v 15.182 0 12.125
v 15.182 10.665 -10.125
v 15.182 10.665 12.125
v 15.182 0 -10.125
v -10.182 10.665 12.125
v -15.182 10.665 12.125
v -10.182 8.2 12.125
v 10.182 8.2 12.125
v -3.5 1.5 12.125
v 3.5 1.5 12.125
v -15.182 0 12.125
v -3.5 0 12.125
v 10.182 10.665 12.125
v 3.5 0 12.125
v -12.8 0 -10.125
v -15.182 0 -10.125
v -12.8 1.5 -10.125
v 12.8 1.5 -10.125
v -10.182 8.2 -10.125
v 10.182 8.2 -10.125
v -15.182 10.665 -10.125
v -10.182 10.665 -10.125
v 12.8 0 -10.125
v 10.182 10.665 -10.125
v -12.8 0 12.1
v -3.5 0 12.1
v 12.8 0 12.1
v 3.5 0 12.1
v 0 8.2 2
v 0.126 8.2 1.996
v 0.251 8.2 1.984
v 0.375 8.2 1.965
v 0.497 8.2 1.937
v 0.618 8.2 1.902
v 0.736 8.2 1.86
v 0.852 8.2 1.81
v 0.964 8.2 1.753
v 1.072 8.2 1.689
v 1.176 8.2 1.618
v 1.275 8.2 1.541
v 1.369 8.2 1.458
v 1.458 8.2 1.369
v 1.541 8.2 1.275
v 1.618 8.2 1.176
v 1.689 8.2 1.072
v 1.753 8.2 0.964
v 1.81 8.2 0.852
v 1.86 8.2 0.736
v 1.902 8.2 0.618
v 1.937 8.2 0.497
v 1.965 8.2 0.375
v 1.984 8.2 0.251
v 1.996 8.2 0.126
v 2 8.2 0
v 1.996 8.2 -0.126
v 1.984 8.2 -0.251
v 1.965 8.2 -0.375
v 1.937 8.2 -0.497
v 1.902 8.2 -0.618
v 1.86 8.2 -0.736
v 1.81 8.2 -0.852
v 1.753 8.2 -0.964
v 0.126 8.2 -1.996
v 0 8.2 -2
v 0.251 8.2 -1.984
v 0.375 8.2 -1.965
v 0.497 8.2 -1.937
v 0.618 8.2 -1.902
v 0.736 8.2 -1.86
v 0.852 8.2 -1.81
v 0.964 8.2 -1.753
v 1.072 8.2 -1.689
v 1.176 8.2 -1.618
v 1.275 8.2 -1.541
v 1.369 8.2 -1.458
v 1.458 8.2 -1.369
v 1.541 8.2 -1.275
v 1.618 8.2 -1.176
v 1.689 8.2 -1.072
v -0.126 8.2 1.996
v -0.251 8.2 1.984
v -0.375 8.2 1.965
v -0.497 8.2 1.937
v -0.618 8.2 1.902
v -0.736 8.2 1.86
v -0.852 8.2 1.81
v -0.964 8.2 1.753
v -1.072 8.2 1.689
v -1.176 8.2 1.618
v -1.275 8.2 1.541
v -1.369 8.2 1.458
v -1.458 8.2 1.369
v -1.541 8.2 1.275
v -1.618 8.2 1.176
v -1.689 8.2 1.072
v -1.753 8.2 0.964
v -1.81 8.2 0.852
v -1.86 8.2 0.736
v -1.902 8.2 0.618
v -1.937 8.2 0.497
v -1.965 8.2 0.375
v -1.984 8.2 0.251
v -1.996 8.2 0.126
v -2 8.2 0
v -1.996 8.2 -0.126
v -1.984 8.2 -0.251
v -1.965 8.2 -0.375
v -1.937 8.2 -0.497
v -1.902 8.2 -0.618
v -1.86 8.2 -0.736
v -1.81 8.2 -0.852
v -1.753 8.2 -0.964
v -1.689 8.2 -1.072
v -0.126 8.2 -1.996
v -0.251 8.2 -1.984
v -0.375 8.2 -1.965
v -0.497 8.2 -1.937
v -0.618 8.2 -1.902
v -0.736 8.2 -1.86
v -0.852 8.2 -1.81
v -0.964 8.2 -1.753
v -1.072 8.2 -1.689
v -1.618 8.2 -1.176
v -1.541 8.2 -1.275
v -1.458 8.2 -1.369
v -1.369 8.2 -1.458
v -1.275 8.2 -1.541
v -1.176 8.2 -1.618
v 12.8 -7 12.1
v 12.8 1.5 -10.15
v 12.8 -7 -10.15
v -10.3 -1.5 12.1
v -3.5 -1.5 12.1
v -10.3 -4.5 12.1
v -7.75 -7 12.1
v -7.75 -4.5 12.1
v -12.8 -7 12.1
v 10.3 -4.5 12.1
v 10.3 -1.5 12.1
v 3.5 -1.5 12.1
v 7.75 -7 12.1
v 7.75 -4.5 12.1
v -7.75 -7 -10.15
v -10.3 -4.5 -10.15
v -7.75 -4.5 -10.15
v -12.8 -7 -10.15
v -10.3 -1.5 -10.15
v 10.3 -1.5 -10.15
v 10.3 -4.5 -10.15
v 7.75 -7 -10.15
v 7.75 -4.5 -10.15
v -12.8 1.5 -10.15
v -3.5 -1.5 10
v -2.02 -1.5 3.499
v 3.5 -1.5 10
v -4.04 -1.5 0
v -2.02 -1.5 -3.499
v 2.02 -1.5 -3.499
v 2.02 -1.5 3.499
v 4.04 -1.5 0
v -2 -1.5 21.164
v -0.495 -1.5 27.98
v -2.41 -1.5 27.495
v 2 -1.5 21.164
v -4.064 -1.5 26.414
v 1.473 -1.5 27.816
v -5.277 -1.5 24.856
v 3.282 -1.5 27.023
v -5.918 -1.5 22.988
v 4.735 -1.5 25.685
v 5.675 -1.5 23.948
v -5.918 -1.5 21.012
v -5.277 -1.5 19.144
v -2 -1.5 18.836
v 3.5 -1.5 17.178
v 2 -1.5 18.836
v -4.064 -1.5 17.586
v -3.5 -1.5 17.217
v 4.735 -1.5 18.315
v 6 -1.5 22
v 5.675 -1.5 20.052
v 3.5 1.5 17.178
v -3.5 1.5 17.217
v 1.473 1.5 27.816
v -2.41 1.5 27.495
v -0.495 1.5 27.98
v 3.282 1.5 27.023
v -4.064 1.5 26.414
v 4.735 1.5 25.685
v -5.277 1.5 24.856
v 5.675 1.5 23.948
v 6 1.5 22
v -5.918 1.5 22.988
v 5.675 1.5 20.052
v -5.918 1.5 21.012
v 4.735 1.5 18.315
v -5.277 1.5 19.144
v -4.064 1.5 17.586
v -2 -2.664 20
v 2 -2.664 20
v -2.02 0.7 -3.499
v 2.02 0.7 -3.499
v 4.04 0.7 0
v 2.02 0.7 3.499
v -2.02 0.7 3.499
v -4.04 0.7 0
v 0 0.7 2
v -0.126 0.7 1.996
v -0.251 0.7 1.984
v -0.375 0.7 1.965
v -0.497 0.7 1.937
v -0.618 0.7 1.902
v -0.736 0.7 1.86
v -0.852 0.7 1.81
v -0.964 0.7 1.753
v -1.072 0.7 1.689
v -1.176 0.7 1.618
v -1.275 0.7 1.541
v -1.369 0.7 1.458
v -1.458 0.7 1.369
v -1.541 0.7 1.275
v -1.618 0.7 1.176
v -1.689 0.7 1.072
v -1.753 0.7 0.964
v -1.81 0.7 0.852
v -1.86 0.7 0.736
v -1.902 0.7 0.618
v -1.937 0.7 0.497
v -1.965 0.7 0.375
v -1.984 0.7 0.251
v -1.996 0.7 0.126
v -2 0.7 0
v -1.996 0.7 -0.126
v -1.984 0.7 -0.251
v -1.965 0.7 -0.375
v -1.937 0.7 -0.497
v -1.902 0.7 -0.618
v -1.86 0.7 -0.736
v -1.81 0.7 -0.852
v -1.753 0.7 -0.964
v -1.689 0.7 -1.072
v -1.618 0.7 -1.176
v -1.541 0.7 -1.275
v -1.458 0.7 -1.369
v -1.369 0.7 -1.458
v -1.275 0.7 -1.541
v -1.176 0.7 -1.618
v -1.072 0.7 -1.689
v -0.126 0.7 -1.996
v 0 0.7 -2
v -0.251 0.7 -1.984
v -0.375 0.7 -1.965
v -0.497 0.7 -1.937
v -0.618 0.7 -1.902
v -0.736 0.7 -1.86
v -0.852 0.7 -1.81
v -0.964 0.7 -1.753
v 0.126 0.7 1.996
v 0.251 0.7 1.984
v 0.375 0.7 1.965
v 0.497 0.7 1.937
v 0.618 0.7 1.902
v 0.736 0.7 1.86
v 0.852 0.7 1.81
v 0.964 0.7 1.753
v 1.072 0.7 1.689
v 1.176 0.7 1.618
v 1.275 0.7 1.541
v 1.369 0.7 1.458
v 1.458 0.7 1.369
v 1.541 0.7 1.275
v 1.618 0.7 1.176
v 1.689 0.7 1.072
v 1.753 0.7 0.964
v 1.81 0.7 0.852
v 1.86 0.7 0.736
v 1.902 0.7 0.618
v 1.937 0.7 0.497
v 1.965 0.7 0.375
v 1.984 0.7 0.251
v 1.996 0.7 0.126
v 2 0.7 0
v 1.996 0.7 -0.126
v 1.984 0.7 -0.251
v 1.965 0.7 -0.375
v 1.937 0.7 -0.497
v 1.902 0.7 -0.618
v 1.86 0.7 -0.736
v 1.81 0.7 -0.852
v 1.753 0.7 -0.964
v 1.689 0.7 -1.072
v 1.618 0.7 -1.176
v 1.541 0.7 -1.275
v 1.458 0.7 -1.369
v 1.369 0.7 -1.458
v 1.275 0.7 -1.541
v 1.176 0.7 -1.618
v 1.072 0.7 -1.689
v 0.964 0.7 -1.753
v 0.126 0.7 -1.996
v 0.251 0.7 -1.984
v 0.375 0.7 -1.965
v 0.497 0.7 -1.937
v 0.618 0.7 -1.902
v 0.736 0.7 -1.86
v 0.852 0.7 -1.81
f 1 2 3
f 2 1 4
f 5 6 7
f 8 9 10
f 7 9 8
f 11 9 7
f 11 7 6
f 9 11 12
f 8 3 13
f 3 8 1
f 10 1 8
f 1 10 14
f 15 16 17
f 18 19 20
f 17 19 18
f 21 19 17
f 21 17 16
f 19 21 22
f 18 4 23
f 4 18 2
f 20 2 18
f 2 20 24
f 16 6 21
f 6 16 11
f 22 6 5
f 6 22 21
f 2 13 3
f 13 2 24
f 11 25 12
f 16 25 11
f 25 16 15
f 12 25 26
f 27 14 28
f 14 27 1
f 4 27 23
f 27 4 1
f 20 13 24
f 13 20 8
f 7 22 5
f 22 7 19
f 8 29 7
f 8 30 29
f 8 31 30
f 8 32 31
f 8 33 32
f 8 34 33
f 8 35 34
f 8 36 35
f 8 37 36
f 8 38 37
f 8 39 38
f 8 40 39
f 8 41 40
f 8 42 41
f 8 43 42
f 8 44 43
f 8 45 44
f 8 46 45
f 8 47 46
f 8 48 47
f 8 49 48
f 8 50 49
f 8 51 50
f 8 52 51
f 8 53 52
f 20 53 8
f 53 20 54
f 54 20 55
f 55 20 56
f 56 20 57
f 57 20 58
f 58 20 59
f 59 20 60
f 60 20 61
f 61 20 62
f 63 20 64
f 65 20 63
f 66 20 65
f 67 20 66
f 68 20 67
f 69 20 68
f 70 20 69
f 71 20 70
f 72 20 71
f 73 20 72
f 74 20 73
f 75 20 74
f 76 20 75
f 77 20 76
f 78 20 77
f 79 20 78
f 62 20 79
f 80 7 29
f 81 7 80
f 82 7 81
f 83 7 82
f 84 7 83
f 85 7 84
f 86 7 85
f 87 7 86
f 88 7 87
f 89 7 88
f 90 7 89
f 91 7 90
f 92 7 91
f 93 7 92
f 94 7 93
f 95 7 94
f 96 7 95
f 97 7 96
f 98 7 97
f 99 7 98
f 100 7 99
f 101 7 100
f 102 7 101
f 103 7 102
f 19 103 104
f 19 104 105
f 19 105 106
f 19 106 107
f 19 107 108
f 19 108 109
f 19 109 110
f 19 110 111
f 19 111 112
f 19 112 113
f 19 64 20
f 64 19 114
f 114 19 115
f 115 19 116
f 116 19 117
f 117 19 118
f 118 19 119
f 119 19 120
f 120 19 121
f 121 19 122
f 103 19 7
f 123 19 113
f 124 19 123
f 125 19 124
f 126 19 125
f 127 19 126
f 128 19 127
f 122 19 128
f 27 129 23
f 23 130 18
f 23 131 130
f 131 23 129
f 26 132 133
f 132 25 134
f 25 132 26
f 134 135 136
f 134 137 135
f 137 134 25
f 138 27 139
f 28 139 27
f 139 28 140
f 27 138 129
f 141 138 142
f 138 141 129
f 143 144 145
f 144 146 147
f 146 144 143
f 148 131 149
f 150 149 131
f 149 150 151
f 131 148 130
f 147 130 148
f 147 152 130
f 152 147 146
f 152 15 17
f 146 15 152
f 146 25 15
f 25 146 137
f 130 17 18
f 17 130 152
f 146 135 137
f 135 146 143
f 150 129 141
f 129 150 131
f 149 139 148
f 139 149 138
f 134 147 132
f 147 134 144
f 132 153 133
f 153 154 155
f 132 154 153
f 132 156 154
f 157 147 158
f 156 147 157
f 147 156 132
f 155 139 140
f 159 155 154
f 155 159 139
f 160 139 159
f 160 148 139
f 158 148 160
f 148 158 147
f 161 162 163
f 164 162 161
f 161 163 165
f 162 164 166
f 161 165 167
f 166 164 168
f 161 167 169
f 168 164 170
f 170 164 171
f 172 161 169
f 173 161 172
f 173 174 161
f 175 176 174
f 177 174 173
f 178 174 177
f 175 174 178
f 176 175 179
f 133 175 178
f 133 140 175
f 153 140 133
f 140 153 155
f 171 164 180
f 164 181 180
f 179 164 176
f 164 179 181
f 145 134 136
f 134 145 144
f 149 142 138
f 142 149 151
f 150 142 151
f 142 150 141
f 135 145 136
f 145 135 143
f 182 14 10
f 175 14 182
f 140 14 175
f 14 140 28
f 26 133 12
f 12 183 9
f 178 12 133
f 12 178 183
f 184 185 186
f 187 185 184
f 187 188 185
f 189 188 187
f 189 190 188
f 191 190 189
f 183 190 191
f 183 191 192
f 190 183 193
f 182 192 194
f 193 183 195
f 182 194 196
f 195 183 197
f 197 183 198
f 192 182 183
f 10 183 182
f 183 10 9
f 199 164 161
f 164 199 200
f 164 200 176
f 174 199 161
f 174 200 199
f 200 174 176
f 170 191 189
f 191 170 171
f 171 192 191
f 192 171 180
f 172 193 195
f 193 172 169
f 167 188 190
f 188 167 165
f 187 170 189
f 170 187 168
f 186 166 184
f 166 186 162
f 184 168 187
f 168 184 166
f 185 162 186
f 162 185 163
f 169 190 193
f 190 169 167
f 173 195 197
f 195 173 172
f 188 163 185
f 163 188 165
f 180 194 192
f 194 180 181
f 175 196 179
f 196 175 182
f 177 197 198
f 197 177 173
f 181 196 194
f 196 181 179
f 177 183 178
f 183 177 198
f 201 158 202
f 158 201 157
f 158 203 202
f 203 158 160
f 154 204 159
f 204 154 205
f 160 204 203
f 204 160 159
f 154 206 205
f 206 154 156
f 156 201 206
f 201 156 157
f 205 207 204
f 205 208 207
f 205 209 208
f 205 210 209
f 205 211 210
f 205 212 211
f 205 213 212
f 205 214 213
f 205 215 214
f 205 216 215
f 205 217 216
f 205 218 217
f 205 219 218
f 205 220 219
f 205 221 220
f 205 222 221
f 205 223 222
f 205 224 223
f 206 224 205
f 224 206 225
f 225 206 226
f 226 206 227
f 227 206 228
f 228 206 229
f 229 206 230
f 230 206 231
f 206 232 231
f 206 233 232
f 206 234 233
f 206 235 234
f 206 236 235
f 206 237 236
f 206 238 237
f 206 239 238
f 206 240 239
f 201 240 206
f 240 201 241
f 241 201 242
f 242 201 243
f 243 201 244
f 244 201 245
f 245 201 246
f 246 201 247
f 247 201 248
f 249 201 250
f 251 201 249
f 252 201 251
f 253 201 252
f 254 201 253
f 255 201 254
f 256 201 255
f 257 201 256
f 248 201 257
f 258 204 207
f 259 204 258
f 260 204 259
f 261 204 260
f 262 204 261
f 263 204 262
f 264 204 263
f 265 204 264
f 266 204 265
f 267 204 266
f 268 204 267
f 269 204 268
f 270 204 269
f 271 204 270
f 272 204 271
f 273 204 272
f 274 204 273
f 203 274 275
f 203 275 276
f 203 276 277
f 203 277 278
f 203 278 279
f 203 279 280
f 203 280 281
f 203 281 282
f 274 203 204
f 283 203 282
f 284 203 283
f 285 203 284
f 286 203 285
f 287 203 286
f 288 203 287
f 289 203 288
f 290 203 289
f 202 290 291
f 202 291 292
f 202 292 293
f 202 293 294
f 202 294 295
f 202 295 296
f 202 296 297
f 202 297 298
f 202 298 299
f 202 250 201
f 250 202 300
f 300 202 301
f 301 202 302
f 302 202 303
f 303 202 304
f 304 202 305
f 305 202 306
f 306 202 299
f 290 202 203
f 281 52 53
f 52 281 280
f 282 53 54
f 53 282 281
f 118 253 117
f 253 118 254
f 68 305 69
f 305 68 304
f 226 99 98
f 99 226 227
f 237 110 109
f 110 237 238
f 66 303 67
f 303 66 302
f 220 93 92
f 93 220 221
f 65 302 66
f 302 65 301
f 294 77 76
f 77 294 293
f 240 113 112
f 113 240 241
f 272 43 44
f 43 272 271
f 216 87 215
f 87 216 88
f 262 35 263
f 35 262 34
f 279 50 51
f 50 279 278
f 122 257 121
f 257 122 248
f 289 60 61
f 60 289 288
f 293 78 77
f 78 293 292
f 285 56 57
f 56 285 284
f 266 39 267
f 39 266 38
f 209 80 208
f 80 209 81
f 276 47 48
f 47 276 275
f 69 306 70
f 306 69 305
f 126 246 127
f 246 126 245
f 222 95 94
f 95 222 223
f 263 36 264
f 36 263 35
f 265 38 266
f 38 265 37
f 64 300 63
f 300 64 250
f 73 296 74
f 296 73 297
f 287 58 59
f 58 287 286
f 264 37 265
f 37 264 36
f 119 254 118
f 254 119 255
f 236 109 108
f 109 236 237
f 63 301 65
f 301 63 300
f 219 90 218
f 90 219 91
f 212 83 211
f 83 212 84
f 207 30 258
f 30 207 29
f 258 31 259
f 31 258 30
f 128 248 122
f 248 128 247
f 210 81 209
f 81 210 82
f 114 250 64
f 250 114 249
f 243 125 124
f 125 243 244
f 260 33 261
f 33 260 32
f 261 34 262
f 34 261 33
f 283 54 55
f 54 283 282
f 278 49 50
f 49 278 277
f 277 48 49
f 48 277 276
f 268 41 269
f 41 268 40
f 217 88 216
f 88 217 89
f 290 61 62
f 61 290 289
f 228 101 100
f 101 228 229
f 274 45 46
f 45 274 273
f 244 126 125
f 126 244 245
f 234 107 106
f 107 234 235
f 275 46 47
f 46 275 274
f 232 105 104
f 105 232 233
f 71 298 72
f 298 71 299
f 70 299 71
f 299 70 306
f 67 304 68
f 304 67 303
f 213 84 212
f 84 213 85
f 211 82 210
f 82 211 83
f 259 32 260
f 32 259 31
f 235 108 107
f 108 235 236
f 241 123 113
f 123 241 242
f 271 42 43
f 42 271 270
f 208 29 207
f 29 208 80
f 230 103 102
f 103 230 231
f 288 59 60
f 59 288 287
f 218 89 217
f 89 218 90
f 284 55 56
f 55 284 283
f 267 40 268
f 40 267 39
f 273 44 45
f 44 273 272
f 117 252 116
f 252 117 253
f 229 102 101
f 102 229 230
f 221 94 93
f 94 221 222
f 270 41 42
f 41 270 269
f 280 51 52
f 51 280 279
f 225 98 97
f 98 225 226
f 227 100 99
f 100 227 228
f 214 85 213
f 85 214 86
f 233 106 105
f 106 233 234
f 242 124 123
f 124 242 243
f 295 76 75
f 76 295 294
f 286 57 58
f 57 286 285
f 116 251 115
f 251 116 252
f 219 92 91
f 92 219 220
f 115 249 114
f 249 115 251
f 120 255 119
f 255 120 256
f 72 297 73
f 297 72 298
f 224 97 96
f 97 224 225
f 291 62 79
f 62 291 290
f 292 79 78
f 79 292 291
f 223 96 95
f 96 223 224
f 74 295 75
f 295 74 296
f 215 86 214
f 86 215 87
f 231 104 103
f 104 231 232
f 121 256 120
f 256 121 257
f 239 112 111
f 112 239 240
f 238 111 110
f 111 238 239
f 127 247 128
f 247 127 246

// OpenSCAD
/*

Adapter for bike light to rack
Gian Pablo Villamil
May 30, 2011

*/

bracket_height = 22.25;
tongue_width = 20.6;
tongue_thickness = 3;
base_width = 15.5;
base_thickness = 2.5;
side_thickness = 2.5;

plate_thickness = 3;
plate_width = 100;
plate_height = 20.3;

hole_dia = 5.8 ;
hole_sep = 82 ;

// these are the dimensions of the rack bracket I have mm
rack_bracket_width = 15.365; 
rack_bracket_thick = 2.465; 
slop = 5; // mm amount of tolerance for printing

giant_dimension = 1000; 

// these were copied from my corner reflector T-style mount
m4_nut_height = 3.2; // global
module m4_nut_hole(){
    $fn = 6; // hex nut
    // see https://www.engineersedge.com/hardware/standard_metric_hex_nuts_13728.htm
    // for dimensions
    nut_height = 3.3; // max height allowed in spec
    //nut_width = 7.0; // max distance between flats
    nut_width = 8.08; // max distance between peaks
    cylinder( h = nut_height, r1 = nut_width/2, r2 = nut_width/2 );
    
}//end m4_nut_hole
//m4_nut_hole();

module m4_thru_hole(){
    m4_diam = 4; //mm
    $fn=100;
    cylinder( h =giant_dimension, r = m4_diam/2, center = true ); 
} //end m4_thru_hole

module m4_nut_and_thru(){
  translate([ 0,0,-m4_nut_height ]){
    m4_nut_hole();
}
m4_thru_hole();  
}// end m4_nut_and_thru
// dimensions of the extra material for bolt old and nuts

module plate() {
	difference() {
		union() {
			cube(size= [hole_sep, plate_thickness, plate_height], center = true);
			translate ([hole_sep/2,0,0]) rotate (a = 90, v = [1,0,0]) 
				cylinder(h = plate_thickness, r = plate_height/2, center = true);
			translate ([-hole_sep/2,0,0]) rotate (a = 90, v = [1,0,0]) 
				cylinder(h = plate_thickness, r = plate_height/2, center = true);
			translate ([hole_sep/2+plate_height/4,0,-plate_height/4])
				cube(size = [plate_height/2,plate_thickness,plate_height/2],center = true);
			translate ([-(hole_sep/2+plate_height/4),0,-plate_height/4])
				cube(size = [plate_height/2,plate_thickness,plate_height/2],center = true);

		}
		translate ([hole_sep/2,0,0]) rotate (a = 90, v = [1,0,0]) 
			cylinder(h = plate_thickness+2, r = hole_dia/2, center = true);
		translate ([-hole_sep/2,0,0]) rotate (a = 90, v = [1,0,0]) 
			cylinder(h = plate_thickness+2, r = hole_dia/2, center = true);
	};
};

module bracket_thick() {
    
    // these are the dimensions for the slot that the rack bracket will fit into
    slot_width = rack_bracket_width + slop; 
    slot_height = bracket_height;
    slot_thick = rack_bracket_thick; 
    
    wing_thickness = 5; // mm
    
    bracket_thickness = 5; // mm used dims from corner reflector design
    
    total_thick = slot_thick + m4_nut_height + bracket_thickness ; 
    total_width = slot_width + 2*wing_thickness ; 
    total_height = slot_height; 
    
    translate( [ 0, 0, 1] )
    difference() {
        
        // this is the main outer shape
        translate( [-total_width/2, 0, -total_height/2 ]  )
        cube( [ total_width, total_thick, total_height  ] );      
    
        // this is the cutout
        translate( [ -slot_width/2, total_thick-slot_thick, -slot_height/2 ] )
        cube( [ slot_width, slot_thick, slot_height ]); 
        
        
    } // end difference 
    
}; //end bracket_thick

module bracket() {
	difference(){
		translate([-(tongue_width+(side_thickness *2))/2,0,0])
		cube(size = [tongue_width+(side_thickness * 2),plate_thickness+tongue_thickness+base_thickness, bracket_height], center = false);
		translate([-tongue_width/2,2.5,0])
		cube(size = [tongue_width, tongue_thickness, bracket_height], center=false);
		translate([-base_width/2,0,0])
		cube(size = [base_width, base_thickness, bracket_height], center=false);
	};
};

module release() {
	union() {
		translate([-3.5,-plate_thickness/2,0])
		#cube(size = [7, plate_thickness, 10], center = false);
		translate([0,-1.25,10]) rotate(a = 45, v = [1,0,0])
		cube(size = [4,2,2], center = true);
		translate([0,plate_thickness/2,12]) rotate(a = 90, v = [1,0,0])
		cylinder(h = plate_thickness, r = 6);
	};
}



difference() {
    
union() {
//plate();
bracket_thick(); 
translate([0,-7,-plate_height/2])
bracket();
translate([0,0,10])
release();} // end union

translate( [0, -base_thickness, 0] )
rotate( [90, 0, 0] )
m4_nut_and_thru(); 
}
//end difference
